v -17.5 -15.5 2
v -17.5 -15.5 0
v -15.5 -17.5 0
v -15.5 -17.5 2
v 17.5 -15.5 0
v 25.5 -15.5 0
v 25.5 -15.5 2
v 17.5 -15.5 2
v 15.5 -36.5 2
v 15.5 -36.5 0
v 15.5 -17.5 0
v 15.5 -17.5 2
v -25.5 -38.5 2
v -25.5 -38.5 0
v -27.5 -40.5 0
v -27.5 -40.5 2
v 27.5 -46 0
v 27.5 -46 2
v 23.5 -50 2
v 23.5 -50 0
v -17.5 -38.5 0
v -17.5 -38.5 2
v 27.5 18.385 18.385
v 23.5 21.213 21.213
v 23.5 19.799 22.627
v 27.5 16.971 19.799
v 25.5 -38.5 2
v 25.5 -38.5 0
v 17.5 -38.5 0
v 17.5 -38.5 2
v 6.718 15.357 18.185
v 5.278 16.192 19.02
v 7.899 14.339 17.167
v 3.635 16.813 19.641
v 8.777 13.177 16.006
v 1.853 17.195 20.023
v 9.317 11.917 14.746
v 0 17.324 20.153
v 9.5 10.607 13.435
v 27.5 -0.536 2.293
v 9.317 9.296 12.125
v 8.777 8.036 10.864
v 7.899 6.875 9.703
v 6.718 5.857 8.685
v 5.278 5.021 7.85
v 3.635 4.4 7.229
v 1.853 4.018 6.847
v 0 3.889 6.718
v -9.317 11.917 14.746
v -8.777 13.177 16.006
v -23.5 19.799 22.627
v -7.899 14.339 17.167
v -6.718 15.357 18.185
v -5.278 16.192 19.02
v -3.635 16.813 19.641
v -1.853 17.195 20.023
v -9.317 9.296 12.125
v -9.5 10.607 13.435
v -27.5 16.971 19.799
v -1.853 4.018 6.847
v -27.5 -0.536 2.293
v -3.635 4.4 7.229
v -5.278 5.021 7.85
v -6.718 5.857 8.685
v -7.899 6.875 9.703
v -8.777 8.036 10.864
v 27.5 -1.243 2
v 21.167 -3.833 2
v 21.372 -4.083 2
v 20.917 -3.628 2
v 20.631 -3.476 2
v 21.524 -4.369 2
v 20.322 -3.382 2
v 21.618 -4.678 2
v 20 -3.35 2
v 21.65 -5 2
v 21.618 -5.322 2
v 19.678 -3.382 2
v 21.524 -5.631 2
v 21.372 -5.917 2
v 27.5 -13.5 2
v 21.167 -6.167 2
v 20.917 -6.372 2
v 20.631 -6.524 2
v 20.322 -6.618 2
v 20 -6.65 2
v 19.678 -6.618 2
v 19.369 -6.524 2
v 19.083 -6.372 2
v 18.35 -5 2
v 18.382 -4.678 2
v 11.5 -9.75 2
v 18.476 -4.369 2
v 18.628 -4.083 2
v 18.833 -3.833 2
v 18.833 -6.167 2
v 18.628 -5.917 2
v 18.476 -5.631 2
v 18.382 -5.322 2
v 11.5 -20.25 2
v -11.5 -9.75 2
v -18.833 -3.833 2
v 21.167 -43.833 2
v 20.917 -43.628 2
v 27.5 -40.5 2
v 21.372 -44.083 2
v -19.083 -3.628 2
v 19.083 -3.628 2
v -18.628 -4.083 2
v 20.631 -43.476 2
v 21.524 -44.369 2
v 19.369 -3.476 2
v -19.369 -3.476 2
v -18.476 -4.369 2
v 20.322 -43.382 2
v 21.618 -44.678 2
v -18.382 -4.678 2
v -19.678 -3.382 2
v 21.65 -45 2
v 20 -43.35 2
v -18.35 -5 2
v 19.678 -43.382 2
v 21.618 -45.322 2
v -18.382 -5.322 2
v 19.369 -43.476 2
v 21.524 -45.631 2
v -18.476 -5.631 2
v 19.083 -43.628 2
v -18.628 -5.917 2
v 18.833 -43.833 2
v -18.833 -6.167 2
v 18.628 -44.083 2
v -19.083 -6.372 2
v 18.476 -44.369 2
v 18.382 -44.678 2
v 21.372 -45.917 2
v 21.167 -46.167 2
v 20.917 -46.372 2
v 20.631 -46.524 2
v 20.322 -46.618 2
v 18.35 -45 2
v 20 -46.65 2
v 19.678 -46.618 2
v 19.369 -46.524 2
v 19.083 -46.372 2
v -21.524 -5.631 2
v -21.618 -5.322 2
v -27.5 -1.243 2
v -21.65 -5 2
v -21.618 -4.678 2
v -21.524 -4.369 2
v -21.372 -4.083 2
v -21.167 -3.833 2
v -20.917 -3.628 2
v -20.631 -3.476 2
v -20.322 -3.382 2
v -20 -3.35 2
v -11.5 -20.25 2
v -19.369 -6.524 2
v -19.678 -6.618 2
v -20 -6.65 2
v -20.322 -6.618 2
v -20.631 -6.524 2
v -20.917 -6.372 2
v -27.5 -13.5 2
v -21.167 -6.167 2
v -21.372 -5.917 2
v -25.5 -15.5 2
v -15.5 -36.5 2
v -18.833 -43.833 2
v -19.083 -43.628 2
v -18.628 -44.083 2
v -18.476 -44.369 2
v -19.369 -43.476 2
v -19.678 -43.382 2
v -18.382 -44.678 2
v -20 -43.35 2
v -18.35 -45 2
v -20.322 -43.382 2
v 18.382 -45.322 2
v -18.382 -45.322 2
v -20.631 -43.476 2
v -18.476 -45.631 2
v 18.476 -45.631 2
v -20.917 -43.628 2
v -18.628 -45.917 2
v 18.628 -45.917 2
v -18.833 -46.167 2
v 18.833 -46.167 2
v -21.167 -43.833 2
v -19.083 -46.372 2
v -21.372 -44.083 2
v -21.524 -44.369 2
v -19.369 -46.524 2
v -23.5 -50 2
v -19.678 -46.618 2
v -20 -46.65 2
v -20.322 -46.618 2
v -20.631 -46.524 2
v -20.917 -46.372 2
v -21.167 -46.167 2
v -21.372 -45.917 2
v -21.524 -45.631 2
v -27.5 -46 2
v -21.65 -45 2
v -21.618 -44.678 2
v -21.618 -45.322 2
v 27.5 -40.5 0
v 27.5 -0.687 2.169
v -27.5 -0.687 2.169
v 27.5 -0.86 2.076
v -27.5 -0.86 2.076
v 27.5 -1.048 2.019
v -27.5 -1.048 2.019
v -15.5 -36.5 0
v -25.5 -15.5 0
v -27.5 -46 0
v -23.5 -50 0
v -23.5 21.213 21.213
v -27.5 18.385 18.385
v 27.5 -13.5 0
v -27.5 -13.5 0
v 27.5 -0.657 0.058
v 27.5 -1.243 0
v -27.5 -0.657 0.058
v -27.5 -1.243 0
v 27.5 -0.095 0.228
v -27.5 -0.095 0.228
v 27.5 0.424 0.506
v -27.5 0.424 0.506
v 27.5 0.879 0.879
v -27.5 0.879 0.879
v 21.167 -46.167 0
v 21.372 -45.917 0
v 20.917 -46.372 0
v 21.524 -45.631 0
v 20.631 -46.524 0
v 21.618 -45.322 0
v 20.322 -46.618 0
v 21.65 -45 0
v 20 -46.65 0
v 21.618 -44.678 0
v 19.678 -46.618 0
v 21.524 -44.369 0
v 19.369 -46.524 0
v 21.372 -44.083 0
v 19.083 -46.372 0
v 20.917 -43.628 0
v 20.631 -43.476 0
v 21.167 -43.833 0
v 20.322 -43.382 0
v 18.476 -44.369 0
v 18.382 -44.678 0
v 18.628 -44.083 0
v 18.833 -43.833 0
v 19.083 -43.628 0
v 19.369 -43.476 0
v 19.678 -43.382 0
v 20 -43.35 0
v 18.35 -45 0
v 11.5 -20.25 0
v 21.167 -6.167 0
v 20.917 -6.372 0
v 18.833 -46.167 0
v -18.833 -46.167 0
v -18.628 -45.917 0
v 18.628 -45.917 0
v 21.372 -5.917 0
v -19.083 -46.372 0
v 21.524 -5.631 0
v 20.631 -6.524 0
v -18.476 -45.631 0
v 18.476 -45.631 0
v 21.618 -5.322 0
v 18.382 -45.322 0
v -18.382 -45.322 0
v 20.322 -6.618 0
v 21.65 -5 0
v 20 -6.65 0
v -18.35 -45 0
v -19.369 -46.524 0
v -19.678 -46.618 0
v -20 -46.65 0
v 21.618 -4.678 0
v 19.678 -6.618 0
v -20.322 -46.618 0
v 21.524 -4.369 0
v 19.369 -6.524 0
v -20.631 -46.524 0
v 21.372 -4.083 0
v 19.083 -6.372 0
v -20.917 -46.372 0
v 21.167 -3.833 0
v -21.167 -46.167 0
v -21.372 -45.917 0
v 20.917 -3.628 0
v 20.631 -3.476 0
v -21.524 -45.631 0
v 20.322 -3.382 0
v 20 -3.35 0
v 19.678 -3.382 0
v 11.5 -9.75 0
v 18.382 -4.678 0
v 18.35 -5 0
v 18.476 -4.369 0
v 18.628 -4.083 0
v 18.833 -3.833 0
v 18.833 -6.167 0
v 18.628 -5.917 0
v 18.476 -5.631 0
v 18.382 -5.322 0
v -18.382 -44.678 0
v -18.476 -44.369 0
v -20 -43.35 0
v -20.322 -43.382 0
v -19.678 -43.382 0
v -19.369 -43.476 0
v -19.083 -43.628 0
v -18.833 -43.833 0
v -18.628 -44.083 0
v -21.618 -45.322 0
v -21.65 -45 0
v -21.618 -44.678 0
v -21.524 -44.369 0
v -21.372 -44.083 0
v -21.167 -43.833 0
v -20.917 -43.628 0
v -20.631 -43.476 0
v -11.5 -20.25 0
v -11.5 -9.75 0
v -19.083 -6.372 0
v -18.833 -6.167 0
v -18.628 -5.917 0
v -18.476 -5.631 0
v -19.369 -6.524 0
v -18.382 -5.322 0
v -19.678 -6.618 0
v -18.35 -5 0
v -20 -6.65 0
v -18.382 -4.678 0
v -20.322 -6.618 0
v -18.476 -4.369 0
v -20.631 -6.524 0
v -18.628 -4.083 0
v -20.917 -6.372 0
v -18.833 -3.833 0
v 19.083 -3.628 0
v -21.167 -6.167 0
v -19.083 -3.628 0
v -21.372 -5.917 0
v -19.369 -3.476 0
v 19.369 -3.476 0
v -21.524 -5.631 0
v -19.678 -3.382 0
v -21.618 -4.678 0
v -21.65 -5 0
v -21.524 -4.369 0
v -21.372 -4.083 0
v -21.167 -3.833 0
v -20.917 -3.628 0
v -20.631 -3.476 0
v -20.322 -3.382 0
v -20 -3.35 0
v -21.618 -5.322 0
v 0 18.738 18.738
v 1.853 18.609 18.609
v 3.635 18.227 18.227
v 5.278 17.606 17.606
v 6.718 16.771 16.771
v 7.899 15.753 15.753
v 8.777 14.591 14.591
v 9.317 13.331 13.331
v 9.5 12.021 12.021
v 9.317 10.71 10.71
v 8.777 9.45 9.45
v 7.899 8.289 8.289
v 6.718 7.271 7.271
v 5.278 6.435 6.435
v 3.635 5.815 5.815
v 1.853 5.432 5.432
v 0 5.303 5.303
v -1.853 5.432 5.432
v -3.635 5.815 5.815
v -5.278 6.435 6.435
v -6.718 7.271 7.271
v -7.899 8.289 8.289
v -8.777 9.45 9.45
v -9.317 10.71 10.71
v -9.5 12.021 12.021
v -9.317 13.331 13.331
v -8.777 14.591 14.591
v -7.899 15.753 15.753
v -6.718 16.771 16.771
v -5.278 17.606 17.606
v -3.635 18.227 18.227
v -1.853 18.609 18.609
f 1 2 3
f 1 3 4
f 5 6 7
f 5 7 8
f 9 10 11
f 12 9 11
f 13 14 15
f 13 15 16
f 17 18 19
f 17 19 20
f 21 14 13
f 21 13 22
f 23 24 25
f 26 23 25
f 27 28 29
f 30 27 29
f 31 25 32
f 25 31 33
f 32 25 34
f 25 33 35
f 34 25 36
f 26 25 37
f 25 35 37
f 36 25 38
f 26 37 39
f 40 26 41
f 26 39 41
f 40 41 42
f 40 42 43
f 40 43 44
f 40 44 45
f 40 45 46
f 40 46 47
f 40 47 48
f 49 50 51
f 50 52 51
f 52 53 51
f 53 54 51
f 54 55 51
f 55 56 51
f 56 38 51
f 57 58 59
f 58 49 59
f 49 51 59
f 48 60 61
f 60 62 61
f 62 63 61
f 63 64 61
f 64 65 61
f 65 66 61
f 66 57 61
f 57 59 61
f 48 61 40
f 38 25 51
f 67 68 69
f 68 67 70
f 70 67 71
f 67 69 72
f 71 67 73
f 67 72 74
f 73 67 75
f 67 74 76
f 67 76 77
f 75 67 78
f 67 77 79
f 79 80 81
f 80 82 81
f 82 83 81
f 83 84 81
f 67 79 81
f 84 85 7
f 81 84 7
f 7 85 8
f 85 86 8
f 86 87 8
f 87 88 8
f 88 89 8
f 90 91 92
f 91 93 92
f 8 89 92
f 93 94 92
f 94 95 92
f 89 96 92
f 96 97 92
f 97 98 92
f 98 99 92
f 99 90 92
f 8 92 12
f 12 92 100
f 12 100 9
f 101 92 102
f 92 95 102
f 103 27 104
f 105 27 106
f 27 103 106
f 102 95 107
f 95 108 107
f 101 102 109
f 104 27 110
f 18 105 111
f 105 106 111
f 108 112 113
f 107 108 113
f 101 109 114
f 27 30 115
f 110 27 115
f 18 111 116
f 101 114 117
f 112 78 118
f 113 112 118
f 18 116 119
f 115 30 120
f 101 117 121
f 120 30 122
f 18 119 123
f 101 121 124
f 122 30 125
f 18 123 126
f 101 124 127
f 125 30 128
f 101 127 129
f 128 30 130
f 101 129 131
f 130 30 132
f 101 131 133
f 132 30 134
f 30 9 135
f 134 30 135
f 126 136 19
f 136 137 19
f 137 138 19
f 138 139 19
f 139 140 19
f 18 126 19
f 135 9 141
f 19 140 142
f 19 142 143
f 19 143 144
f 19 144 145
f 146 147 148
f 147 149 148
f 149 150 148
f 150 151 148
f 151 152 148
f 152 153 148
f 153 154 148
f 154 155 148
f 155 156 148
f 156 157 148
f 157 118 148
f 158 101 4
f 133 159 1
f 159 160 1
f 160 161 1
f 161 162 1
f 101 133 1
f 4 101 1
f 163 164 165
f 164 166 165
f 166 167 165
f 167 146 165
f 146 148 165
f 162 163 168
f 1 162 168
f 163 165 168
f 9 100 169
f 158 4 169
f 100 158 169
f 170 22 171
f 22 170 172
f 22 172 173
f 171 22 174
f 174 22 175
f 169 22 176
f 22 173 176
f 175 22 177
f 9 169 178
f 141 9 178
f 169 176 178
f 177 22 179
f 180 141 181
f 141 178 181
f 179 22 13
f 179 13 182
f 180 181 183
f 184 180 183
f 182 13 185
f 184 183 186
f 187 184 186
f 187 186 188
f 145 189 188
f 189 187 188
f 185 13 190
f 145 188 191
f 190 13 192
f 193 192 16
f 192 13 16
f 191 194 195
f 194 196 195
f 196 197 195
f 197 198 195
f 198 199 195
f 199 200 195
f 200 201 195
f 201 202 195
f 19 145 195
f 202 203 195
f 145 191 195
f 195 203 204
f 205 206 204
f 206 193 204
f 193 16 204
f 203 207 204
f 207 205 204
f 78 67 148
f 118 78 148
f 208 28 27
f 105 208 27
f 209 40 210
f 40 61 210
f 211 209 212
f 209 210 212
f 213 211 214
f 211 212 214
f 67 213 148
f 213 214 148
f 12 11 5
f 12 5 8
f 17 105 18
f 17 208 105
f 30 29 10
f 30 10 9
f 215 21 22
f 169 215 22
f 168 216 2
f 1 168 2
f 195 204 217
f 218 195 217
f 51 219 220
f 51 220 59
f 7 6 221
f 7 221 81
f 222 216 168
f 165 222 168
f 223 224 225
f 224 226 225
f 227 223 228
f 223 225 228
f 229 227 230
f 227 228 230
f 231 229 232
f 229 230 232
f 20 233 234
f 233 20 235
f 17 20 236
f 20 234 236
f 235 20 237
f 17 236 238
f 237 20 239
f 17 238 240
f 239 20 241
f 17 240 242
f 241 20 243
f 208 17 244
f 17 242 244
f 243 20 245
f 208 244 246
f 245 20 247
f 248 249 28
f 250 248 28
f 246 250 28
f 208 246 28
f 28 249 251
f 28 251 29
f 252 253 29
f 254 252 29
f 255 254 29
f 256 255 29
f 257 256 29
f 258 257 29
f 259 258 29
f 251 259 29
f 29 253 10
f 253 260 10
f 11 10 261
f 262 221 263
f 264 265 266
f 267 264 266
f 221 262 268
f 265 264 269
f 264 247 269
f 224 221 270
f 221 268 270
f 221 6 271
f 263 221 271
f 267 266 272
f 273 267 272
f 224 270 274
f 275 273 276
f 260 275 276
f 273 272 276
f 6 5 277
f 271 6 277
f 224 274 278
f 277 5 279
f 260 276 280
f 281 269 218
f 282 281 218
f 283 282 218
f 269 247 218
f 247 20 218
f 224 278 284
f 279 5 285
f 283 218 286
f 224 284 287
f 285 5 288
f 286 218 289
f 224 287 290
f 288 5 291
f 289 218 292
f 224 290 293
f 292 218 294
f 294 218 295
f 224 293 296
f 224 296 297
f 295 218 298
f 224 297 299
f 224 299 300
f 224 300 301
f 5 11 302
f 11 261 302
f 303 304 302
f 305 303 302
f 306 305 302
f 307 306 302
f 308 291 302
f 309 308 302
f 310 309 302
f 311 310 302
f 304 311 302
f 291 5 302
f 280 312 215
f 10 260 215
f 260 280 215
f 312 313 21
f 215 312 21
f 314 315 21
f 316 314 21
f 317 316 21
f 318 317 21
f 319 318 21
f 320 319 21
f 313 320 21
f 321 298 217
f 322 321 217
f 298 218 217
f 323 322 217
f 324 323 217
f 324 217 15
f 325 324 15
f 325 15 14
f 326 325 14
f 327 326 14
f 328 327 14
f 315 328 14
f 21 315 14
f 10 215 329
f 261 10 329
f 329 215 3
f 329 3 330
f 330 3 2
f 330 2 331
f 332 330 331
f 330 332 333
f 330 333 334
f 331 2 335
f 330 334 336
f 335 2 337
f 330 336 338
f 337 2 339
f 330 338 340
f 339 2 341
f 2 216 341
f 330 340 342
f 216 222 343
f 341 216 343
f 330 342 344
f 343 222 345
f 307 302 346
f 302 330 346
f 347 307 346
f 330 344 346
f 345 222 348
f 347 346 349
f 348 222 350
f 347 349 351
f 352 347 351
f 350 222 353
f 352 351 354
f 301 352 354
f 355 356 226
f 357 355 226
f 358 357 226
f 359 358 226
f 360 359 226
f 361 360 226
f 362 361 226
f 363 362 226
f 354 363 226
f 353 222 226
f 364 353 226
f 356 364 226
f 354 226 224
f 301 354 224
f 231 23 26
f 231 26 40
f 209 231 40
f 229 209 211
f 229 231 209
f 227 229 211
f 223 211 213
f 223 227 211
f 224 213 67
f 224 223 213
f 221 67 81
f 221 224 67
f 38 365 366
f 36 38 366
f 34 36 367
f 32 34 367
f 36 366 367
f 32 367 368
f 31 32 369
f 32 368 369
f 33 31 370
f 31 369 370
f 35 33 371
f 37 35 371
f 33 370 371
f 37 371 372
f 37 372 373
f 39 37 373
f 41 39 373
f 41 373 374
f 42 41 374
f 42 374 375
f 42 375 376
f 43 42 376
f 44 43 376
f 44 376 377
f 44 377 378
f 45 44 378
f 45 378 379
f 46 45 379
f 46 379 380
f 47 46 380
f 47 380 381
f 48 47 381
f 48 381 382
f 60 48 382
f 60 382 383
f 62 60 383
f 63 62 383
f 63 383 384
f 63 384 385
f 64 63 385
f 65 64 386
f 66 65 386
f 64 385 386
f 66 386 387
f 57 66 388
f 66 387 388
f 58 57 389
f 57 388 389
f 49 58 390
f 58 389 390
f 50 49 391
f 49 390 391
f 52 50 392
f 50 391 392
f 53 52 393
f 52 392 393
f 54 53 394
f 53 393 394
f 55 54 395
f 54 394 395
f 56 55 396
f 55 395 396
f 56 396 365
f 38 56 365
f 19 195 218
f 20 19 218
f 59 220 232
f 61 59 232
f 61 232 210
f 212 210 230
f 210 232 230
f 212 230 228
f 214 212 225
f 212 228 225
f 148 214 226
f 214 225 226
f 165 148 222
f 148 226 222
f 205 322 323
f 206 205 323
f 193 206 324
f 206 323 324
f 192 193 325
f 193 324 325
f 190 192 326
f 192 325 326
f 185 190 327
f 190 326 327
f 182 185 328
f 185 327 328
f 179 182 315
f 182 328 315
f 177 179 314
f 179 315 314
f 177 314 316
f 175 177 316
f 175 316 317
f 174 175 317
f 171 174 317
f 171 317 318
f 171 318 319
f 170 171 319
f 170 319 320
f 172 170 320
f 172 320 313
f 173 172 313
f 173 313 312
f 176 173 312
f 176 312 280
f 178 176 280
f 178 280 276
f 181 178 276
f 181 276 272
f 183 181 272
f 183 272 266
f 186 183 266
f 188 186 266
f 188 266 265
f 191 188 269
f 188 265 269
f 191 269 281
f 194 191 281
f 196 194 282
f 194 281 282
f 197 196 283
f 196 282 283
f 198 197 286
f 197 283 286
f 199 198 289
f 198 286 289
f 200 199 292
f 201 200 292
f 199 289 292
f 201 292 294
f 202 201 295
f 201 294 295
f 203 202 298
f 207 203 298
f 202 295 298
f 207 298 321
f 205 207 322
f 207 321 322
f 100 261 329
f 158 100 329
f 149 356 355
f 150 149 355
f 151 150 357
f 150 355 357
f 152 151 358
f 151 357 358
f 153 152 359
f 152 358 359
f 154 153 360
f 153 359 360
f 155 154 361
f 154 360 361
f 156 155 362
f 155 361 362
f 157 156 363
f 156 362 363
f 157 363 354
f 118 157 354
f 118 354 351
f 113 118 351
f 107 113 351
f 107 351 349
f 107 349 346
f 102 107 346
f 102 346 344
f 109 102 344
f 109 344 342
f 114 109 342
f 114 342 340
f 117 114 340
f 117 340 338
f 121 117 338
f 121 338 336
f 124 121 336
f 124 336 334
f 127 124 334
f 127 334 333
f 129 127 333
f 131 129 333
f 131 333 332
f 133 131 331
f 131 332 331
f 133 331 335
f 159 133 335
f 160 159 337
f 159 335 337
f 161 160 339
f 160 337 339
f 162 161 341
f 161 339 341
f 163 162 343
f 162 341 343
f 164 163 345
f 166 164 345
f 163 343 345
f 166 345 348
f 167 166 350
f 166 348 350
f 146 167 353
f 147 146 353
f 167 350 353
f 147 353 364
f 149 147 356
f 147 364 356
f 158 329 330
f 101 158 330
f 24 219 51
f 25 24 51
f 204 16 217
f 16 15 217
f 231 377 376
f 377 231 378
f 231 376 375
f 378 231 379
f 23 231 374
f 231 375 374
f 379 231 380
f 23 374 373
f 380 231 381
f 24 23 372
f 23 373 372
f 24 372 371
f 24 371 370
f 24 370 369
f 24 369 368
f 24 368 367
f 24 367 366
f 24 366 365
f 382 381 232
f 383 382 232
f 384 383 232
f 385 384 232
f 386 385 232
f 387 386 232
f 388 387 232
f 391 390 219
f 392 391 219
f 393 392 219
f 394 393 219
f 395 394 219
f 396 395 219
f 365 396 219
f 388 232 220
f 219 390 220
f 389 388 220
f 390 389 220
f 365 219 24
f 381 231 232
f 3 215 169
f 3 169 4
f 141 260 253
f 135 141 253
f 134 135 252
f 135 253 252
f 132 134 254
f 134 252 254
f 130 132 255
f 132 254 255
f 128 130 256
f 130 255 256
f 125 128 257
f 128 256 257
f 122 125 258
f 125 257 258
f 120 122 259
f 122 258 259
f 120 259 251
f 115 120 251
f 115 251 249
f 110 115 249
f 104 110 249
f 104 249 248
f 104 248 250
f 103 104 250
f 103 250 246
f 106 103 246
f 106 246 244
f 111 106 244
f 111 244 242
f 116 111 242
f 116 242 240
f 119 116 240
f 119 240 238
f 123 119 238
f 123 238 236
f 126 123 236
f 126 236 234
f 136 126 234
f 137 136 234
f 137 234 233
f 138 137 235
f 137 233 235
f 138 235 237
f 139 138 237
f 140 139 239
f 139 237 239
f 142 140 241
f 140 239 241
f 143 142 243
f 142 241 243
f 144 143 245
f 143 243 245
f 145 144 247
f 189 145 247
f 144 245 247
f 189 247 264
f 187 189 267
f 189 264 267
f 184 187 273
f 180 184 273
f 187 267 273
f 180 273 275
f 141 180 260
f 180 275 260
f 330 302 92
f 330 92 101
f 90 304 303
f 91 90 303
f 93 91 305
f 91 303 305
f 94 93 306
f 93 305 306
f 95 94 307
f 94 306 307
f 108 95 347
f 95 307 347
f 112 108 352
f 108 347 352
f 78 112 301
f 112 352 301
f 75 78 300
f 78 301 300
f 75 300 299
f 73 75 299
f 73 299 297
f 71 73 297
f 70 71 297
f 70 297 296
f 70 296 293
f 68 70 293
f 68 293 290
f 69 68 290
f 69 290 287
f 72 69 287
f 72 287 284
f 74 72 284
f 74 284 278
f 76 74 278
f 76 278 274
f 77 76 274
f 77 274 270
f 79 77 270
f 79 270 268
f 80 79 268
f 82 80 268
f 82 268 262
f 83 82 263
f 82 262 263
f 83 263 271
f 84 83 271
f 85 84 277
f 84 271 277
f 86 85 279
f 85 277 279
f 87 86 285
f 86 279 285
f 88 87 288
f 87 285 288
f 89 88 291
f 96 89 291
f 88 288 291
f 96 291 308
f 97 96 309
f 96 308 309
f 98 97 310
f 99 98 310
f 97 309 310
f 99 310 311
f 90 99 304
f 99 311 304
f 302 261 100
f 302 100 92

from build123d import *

# Parameters (mm, degrees)
SM_BASE_FLANGE_1_DEPTH = 27.5
CHAMFER_1_SIZE         = 4
SKETCH_6_R             = 9.5
CUT_EXTRUDE_1_DEPTH    = 62.386073339
SKETCH_7_W             = 12
SKETCH_7_H             = 23
CUT_EXTRUDE_2_DEPTH    = 62.386073339
CHAMFER_2_SIZE         = 2
SKETCH_9_W             = 23
SKETCH_9_H             = 10.5
CUT_EXTRUDE_4_DEPTH    = 62.386073339
CUT_EXTRUDE_5_REACH    = 63.386
SKETCH_10_R            = 1.65


# Sheet-metal steps are written as plain solids
with BuildPart() as part:
    # Sketch 1 → 基材-凸緣1 (new, symmetric)
    with BuildSketch(Plane(origin=(0, 0, 0), x_dir=(0, 1, 0), z_dir=(-1, 0, 0))):
        with BuildLine():
            Line((-50, 0), (-1.242640687, 0))
            ThreePointArc((-1.242640687, 0), (-0.09459039, -0.228361402), (0.878679656, -0.878679656))
            Line((0.878679656, -0.878679656), (21.213203436, -21.213203436))
            Line((21.213203436, -21.213203436), (19.798989873, -22.627416998))
            Line((19.798989873, -22.627416998), (-0.535533906, -2.292893219))
            ThreePointArc((-0.535533906, -2.292893219), (-0.859957255, -2.076120467), (-1.242640687, -2))
            Line((-1.242640687, -2), (-50, -2))
            Line((-50, -2), (-50, 0))
        make_face()
    extrude(amount=SM_BASE_FLANGE_1_DEPTH, both=True)

    # 導角1
    chamfer_1_edges = [part.edges().sort_by_distance(p)[0] for p in [
        (-27.5, -50, 1),
        (-27.5, 20.506096654, 21.920310217),
        (27.5, -50, 1),
        (27.5, 20.506096654, 21.920310217),
    ]]
    chamfer(chamfer_1_edges, length=CHAMFER_1_SIZE)

    # 草圖6 → 除料-伸長1 (cut, through all)
    with BuildSketch(Plane(origin=(0, 0, 0), x_dir=(-0.9655064458746985, -0.1841158643007276, -0.18411586430072824), z_dir=(0, 0.7071067811865488, -0.7071067811865465))):
        with Locations(Location((-4.42644559, 16.41360958, 0), (0, 0, 105.092560886))):
            Circle(SKETCH_6_R)
    extrude(amount=-CUT_EXTRUDE_1_DEPTH, mode=Mode.SUBTRACT)

    # 草圖7 → 除料-伸長2 (cut, through all)
    with BuildSketch(Plane(origin=(0, 0, 0), x_dir=(-1, 0, 0), z_dir=(0, 0, -1))):
        with Locations((-21.5, -27)):
            Rectangle(SKETCH_7_W, SKETCH_7_H)
    cut_extrude_2 = extrude(amount=-CUT_EXTRUDE_2_DEPTH, mode=Mode.SUBTRACT)

    # 鏡射1: 除料-伸長2 across plane
    add(cut_extrude_2.mirror(Plane(origin=(0, 0, 0), x_dir=(0, 0, 1), z_dir=(1, 0, 0))), mode=Mode.SUBTRACT)

    # 導角2
    chamfer_2_edges = [part.edges().sort_by_distance(p)[0] for p in [
        (-15.5, -38.5, 1),
        (-15.5, -15.5, 1),
        (27.5, -38.5, 1),
        (27.5, -15.5, 1),
        (15.5, -15.5, 1),
        (15.5, -38.5, 1),
        (-27.5, -15.5, 1),
        (-27.5, -38.5, 1),
    ]]
    chamfer(chamfer_2_edges, length=CHAMFER_2_SIZE)

    # 草圖9 → 除料-伸長4 (cut, through all)
    with BuildSketch(Plane(origin=(0, 0, 0), x_dir=(-1, 0, 0), z_dir=(0, 0, -1))):
        with Locations((0, -15)):
            Rectangle(SKETCH_9_W, SKETCH_9_H)
    extrude(amount=-CUT_EXTRUDE_4_DEPTH, mode=Mode.SUBTRACT)

    # 草圖10 → 除料-伸長5 (cut, up to next)
    with BuildSketch(Plane(origin=(0, 0, 0), x_dir=(-1, 0, 0), z_dir=(0, 0, -1)), mode=Mode.PRIVATE) as cut_extrude_5_sk1:
        with Locations((20, -45)):
            Circle(SKETCH_10_R)
    cut_extrude_5_tool1 = extrude(cut_extrude_5_sk1.sketch, amount=-CUT_EXTRUDE_5_REACH, mode=Mode.PRIVATE) & part.part
    # 草圖10 → 除料-伸長5 (cut, up to next)
    with BuildSketch(Plane(origin=(0, 0, 0), x_dir=(-1, 0, 0), z_dir=(0, 0, -1)), mode=Mode.PRIVATE) as cut_extrude_5_sk2:
        with Locations((-20, -45)):
            Circle(SKETCH_10_R)
    cut_extrude_5_tool2 = extrude(cut_extrude_5_sk2.sketch, amount=-CUT_EXTRUDE_5_REACH, mode=Mode.PRIVATE) & part.part
    # 草圖10 → 除料-伸長5 (cut, up to next)
    with BuildSketch(Plane(origin=(0, 0, 0), x_dir=(-1, 0, 0), z_dir=(0, 0, -1)), mode=Mode.PRIVATE) as cut_extrude_5_sk3:
        with Locations((-20, -5)):
            Circle(SKETCH_10_R)
    cut_extrude_5_tool3 = extrude(cut_extrude_5_sk3.sketch, amount=-CUT_EXTRUDE_5_REACH, mode=Mode.PRIVATE) & part.part
    # 草圖10 → 除料-伸長5 (cut, up to next)
    with BuildSketch(Plane(origin=(0, 0, 0), x_dir=(-1, 0, 0), z_dir=(0, 0, -1)), mode=Mode.PRIVATE) as cut_extrude_5_sk4:
        with Locations((20, -5)):
            Circle(SKETCH_10_R)
    cut_extrude_5_tool4 = extrude(cut_extrude_5_sk4.sketch, amount=-CUT_EXTRUDE_5_REACH, mode=Mode.PRIVATE) & part.part
    add(cut_extrude_5_tool1.solids().sort_by_distance((-20, -45, 0))[0], mode=Mode.SUBTRACT)
    add(cut_extrude_5_tool2.solids().sort_by_distance((20, -45, 0))[0], mode=Mode.SUBTRACT)
    add(cut_extrude_5_tool3.solids().sort_by_distance((20, -5, 0))[0], mode=Mode.SUBTRACT)
    add(cut_extrude_5_tool4.solids().sort_by_distance((-20, -5, 0))[0], mode=Mode.SUBTRACT)


solid = part.part
